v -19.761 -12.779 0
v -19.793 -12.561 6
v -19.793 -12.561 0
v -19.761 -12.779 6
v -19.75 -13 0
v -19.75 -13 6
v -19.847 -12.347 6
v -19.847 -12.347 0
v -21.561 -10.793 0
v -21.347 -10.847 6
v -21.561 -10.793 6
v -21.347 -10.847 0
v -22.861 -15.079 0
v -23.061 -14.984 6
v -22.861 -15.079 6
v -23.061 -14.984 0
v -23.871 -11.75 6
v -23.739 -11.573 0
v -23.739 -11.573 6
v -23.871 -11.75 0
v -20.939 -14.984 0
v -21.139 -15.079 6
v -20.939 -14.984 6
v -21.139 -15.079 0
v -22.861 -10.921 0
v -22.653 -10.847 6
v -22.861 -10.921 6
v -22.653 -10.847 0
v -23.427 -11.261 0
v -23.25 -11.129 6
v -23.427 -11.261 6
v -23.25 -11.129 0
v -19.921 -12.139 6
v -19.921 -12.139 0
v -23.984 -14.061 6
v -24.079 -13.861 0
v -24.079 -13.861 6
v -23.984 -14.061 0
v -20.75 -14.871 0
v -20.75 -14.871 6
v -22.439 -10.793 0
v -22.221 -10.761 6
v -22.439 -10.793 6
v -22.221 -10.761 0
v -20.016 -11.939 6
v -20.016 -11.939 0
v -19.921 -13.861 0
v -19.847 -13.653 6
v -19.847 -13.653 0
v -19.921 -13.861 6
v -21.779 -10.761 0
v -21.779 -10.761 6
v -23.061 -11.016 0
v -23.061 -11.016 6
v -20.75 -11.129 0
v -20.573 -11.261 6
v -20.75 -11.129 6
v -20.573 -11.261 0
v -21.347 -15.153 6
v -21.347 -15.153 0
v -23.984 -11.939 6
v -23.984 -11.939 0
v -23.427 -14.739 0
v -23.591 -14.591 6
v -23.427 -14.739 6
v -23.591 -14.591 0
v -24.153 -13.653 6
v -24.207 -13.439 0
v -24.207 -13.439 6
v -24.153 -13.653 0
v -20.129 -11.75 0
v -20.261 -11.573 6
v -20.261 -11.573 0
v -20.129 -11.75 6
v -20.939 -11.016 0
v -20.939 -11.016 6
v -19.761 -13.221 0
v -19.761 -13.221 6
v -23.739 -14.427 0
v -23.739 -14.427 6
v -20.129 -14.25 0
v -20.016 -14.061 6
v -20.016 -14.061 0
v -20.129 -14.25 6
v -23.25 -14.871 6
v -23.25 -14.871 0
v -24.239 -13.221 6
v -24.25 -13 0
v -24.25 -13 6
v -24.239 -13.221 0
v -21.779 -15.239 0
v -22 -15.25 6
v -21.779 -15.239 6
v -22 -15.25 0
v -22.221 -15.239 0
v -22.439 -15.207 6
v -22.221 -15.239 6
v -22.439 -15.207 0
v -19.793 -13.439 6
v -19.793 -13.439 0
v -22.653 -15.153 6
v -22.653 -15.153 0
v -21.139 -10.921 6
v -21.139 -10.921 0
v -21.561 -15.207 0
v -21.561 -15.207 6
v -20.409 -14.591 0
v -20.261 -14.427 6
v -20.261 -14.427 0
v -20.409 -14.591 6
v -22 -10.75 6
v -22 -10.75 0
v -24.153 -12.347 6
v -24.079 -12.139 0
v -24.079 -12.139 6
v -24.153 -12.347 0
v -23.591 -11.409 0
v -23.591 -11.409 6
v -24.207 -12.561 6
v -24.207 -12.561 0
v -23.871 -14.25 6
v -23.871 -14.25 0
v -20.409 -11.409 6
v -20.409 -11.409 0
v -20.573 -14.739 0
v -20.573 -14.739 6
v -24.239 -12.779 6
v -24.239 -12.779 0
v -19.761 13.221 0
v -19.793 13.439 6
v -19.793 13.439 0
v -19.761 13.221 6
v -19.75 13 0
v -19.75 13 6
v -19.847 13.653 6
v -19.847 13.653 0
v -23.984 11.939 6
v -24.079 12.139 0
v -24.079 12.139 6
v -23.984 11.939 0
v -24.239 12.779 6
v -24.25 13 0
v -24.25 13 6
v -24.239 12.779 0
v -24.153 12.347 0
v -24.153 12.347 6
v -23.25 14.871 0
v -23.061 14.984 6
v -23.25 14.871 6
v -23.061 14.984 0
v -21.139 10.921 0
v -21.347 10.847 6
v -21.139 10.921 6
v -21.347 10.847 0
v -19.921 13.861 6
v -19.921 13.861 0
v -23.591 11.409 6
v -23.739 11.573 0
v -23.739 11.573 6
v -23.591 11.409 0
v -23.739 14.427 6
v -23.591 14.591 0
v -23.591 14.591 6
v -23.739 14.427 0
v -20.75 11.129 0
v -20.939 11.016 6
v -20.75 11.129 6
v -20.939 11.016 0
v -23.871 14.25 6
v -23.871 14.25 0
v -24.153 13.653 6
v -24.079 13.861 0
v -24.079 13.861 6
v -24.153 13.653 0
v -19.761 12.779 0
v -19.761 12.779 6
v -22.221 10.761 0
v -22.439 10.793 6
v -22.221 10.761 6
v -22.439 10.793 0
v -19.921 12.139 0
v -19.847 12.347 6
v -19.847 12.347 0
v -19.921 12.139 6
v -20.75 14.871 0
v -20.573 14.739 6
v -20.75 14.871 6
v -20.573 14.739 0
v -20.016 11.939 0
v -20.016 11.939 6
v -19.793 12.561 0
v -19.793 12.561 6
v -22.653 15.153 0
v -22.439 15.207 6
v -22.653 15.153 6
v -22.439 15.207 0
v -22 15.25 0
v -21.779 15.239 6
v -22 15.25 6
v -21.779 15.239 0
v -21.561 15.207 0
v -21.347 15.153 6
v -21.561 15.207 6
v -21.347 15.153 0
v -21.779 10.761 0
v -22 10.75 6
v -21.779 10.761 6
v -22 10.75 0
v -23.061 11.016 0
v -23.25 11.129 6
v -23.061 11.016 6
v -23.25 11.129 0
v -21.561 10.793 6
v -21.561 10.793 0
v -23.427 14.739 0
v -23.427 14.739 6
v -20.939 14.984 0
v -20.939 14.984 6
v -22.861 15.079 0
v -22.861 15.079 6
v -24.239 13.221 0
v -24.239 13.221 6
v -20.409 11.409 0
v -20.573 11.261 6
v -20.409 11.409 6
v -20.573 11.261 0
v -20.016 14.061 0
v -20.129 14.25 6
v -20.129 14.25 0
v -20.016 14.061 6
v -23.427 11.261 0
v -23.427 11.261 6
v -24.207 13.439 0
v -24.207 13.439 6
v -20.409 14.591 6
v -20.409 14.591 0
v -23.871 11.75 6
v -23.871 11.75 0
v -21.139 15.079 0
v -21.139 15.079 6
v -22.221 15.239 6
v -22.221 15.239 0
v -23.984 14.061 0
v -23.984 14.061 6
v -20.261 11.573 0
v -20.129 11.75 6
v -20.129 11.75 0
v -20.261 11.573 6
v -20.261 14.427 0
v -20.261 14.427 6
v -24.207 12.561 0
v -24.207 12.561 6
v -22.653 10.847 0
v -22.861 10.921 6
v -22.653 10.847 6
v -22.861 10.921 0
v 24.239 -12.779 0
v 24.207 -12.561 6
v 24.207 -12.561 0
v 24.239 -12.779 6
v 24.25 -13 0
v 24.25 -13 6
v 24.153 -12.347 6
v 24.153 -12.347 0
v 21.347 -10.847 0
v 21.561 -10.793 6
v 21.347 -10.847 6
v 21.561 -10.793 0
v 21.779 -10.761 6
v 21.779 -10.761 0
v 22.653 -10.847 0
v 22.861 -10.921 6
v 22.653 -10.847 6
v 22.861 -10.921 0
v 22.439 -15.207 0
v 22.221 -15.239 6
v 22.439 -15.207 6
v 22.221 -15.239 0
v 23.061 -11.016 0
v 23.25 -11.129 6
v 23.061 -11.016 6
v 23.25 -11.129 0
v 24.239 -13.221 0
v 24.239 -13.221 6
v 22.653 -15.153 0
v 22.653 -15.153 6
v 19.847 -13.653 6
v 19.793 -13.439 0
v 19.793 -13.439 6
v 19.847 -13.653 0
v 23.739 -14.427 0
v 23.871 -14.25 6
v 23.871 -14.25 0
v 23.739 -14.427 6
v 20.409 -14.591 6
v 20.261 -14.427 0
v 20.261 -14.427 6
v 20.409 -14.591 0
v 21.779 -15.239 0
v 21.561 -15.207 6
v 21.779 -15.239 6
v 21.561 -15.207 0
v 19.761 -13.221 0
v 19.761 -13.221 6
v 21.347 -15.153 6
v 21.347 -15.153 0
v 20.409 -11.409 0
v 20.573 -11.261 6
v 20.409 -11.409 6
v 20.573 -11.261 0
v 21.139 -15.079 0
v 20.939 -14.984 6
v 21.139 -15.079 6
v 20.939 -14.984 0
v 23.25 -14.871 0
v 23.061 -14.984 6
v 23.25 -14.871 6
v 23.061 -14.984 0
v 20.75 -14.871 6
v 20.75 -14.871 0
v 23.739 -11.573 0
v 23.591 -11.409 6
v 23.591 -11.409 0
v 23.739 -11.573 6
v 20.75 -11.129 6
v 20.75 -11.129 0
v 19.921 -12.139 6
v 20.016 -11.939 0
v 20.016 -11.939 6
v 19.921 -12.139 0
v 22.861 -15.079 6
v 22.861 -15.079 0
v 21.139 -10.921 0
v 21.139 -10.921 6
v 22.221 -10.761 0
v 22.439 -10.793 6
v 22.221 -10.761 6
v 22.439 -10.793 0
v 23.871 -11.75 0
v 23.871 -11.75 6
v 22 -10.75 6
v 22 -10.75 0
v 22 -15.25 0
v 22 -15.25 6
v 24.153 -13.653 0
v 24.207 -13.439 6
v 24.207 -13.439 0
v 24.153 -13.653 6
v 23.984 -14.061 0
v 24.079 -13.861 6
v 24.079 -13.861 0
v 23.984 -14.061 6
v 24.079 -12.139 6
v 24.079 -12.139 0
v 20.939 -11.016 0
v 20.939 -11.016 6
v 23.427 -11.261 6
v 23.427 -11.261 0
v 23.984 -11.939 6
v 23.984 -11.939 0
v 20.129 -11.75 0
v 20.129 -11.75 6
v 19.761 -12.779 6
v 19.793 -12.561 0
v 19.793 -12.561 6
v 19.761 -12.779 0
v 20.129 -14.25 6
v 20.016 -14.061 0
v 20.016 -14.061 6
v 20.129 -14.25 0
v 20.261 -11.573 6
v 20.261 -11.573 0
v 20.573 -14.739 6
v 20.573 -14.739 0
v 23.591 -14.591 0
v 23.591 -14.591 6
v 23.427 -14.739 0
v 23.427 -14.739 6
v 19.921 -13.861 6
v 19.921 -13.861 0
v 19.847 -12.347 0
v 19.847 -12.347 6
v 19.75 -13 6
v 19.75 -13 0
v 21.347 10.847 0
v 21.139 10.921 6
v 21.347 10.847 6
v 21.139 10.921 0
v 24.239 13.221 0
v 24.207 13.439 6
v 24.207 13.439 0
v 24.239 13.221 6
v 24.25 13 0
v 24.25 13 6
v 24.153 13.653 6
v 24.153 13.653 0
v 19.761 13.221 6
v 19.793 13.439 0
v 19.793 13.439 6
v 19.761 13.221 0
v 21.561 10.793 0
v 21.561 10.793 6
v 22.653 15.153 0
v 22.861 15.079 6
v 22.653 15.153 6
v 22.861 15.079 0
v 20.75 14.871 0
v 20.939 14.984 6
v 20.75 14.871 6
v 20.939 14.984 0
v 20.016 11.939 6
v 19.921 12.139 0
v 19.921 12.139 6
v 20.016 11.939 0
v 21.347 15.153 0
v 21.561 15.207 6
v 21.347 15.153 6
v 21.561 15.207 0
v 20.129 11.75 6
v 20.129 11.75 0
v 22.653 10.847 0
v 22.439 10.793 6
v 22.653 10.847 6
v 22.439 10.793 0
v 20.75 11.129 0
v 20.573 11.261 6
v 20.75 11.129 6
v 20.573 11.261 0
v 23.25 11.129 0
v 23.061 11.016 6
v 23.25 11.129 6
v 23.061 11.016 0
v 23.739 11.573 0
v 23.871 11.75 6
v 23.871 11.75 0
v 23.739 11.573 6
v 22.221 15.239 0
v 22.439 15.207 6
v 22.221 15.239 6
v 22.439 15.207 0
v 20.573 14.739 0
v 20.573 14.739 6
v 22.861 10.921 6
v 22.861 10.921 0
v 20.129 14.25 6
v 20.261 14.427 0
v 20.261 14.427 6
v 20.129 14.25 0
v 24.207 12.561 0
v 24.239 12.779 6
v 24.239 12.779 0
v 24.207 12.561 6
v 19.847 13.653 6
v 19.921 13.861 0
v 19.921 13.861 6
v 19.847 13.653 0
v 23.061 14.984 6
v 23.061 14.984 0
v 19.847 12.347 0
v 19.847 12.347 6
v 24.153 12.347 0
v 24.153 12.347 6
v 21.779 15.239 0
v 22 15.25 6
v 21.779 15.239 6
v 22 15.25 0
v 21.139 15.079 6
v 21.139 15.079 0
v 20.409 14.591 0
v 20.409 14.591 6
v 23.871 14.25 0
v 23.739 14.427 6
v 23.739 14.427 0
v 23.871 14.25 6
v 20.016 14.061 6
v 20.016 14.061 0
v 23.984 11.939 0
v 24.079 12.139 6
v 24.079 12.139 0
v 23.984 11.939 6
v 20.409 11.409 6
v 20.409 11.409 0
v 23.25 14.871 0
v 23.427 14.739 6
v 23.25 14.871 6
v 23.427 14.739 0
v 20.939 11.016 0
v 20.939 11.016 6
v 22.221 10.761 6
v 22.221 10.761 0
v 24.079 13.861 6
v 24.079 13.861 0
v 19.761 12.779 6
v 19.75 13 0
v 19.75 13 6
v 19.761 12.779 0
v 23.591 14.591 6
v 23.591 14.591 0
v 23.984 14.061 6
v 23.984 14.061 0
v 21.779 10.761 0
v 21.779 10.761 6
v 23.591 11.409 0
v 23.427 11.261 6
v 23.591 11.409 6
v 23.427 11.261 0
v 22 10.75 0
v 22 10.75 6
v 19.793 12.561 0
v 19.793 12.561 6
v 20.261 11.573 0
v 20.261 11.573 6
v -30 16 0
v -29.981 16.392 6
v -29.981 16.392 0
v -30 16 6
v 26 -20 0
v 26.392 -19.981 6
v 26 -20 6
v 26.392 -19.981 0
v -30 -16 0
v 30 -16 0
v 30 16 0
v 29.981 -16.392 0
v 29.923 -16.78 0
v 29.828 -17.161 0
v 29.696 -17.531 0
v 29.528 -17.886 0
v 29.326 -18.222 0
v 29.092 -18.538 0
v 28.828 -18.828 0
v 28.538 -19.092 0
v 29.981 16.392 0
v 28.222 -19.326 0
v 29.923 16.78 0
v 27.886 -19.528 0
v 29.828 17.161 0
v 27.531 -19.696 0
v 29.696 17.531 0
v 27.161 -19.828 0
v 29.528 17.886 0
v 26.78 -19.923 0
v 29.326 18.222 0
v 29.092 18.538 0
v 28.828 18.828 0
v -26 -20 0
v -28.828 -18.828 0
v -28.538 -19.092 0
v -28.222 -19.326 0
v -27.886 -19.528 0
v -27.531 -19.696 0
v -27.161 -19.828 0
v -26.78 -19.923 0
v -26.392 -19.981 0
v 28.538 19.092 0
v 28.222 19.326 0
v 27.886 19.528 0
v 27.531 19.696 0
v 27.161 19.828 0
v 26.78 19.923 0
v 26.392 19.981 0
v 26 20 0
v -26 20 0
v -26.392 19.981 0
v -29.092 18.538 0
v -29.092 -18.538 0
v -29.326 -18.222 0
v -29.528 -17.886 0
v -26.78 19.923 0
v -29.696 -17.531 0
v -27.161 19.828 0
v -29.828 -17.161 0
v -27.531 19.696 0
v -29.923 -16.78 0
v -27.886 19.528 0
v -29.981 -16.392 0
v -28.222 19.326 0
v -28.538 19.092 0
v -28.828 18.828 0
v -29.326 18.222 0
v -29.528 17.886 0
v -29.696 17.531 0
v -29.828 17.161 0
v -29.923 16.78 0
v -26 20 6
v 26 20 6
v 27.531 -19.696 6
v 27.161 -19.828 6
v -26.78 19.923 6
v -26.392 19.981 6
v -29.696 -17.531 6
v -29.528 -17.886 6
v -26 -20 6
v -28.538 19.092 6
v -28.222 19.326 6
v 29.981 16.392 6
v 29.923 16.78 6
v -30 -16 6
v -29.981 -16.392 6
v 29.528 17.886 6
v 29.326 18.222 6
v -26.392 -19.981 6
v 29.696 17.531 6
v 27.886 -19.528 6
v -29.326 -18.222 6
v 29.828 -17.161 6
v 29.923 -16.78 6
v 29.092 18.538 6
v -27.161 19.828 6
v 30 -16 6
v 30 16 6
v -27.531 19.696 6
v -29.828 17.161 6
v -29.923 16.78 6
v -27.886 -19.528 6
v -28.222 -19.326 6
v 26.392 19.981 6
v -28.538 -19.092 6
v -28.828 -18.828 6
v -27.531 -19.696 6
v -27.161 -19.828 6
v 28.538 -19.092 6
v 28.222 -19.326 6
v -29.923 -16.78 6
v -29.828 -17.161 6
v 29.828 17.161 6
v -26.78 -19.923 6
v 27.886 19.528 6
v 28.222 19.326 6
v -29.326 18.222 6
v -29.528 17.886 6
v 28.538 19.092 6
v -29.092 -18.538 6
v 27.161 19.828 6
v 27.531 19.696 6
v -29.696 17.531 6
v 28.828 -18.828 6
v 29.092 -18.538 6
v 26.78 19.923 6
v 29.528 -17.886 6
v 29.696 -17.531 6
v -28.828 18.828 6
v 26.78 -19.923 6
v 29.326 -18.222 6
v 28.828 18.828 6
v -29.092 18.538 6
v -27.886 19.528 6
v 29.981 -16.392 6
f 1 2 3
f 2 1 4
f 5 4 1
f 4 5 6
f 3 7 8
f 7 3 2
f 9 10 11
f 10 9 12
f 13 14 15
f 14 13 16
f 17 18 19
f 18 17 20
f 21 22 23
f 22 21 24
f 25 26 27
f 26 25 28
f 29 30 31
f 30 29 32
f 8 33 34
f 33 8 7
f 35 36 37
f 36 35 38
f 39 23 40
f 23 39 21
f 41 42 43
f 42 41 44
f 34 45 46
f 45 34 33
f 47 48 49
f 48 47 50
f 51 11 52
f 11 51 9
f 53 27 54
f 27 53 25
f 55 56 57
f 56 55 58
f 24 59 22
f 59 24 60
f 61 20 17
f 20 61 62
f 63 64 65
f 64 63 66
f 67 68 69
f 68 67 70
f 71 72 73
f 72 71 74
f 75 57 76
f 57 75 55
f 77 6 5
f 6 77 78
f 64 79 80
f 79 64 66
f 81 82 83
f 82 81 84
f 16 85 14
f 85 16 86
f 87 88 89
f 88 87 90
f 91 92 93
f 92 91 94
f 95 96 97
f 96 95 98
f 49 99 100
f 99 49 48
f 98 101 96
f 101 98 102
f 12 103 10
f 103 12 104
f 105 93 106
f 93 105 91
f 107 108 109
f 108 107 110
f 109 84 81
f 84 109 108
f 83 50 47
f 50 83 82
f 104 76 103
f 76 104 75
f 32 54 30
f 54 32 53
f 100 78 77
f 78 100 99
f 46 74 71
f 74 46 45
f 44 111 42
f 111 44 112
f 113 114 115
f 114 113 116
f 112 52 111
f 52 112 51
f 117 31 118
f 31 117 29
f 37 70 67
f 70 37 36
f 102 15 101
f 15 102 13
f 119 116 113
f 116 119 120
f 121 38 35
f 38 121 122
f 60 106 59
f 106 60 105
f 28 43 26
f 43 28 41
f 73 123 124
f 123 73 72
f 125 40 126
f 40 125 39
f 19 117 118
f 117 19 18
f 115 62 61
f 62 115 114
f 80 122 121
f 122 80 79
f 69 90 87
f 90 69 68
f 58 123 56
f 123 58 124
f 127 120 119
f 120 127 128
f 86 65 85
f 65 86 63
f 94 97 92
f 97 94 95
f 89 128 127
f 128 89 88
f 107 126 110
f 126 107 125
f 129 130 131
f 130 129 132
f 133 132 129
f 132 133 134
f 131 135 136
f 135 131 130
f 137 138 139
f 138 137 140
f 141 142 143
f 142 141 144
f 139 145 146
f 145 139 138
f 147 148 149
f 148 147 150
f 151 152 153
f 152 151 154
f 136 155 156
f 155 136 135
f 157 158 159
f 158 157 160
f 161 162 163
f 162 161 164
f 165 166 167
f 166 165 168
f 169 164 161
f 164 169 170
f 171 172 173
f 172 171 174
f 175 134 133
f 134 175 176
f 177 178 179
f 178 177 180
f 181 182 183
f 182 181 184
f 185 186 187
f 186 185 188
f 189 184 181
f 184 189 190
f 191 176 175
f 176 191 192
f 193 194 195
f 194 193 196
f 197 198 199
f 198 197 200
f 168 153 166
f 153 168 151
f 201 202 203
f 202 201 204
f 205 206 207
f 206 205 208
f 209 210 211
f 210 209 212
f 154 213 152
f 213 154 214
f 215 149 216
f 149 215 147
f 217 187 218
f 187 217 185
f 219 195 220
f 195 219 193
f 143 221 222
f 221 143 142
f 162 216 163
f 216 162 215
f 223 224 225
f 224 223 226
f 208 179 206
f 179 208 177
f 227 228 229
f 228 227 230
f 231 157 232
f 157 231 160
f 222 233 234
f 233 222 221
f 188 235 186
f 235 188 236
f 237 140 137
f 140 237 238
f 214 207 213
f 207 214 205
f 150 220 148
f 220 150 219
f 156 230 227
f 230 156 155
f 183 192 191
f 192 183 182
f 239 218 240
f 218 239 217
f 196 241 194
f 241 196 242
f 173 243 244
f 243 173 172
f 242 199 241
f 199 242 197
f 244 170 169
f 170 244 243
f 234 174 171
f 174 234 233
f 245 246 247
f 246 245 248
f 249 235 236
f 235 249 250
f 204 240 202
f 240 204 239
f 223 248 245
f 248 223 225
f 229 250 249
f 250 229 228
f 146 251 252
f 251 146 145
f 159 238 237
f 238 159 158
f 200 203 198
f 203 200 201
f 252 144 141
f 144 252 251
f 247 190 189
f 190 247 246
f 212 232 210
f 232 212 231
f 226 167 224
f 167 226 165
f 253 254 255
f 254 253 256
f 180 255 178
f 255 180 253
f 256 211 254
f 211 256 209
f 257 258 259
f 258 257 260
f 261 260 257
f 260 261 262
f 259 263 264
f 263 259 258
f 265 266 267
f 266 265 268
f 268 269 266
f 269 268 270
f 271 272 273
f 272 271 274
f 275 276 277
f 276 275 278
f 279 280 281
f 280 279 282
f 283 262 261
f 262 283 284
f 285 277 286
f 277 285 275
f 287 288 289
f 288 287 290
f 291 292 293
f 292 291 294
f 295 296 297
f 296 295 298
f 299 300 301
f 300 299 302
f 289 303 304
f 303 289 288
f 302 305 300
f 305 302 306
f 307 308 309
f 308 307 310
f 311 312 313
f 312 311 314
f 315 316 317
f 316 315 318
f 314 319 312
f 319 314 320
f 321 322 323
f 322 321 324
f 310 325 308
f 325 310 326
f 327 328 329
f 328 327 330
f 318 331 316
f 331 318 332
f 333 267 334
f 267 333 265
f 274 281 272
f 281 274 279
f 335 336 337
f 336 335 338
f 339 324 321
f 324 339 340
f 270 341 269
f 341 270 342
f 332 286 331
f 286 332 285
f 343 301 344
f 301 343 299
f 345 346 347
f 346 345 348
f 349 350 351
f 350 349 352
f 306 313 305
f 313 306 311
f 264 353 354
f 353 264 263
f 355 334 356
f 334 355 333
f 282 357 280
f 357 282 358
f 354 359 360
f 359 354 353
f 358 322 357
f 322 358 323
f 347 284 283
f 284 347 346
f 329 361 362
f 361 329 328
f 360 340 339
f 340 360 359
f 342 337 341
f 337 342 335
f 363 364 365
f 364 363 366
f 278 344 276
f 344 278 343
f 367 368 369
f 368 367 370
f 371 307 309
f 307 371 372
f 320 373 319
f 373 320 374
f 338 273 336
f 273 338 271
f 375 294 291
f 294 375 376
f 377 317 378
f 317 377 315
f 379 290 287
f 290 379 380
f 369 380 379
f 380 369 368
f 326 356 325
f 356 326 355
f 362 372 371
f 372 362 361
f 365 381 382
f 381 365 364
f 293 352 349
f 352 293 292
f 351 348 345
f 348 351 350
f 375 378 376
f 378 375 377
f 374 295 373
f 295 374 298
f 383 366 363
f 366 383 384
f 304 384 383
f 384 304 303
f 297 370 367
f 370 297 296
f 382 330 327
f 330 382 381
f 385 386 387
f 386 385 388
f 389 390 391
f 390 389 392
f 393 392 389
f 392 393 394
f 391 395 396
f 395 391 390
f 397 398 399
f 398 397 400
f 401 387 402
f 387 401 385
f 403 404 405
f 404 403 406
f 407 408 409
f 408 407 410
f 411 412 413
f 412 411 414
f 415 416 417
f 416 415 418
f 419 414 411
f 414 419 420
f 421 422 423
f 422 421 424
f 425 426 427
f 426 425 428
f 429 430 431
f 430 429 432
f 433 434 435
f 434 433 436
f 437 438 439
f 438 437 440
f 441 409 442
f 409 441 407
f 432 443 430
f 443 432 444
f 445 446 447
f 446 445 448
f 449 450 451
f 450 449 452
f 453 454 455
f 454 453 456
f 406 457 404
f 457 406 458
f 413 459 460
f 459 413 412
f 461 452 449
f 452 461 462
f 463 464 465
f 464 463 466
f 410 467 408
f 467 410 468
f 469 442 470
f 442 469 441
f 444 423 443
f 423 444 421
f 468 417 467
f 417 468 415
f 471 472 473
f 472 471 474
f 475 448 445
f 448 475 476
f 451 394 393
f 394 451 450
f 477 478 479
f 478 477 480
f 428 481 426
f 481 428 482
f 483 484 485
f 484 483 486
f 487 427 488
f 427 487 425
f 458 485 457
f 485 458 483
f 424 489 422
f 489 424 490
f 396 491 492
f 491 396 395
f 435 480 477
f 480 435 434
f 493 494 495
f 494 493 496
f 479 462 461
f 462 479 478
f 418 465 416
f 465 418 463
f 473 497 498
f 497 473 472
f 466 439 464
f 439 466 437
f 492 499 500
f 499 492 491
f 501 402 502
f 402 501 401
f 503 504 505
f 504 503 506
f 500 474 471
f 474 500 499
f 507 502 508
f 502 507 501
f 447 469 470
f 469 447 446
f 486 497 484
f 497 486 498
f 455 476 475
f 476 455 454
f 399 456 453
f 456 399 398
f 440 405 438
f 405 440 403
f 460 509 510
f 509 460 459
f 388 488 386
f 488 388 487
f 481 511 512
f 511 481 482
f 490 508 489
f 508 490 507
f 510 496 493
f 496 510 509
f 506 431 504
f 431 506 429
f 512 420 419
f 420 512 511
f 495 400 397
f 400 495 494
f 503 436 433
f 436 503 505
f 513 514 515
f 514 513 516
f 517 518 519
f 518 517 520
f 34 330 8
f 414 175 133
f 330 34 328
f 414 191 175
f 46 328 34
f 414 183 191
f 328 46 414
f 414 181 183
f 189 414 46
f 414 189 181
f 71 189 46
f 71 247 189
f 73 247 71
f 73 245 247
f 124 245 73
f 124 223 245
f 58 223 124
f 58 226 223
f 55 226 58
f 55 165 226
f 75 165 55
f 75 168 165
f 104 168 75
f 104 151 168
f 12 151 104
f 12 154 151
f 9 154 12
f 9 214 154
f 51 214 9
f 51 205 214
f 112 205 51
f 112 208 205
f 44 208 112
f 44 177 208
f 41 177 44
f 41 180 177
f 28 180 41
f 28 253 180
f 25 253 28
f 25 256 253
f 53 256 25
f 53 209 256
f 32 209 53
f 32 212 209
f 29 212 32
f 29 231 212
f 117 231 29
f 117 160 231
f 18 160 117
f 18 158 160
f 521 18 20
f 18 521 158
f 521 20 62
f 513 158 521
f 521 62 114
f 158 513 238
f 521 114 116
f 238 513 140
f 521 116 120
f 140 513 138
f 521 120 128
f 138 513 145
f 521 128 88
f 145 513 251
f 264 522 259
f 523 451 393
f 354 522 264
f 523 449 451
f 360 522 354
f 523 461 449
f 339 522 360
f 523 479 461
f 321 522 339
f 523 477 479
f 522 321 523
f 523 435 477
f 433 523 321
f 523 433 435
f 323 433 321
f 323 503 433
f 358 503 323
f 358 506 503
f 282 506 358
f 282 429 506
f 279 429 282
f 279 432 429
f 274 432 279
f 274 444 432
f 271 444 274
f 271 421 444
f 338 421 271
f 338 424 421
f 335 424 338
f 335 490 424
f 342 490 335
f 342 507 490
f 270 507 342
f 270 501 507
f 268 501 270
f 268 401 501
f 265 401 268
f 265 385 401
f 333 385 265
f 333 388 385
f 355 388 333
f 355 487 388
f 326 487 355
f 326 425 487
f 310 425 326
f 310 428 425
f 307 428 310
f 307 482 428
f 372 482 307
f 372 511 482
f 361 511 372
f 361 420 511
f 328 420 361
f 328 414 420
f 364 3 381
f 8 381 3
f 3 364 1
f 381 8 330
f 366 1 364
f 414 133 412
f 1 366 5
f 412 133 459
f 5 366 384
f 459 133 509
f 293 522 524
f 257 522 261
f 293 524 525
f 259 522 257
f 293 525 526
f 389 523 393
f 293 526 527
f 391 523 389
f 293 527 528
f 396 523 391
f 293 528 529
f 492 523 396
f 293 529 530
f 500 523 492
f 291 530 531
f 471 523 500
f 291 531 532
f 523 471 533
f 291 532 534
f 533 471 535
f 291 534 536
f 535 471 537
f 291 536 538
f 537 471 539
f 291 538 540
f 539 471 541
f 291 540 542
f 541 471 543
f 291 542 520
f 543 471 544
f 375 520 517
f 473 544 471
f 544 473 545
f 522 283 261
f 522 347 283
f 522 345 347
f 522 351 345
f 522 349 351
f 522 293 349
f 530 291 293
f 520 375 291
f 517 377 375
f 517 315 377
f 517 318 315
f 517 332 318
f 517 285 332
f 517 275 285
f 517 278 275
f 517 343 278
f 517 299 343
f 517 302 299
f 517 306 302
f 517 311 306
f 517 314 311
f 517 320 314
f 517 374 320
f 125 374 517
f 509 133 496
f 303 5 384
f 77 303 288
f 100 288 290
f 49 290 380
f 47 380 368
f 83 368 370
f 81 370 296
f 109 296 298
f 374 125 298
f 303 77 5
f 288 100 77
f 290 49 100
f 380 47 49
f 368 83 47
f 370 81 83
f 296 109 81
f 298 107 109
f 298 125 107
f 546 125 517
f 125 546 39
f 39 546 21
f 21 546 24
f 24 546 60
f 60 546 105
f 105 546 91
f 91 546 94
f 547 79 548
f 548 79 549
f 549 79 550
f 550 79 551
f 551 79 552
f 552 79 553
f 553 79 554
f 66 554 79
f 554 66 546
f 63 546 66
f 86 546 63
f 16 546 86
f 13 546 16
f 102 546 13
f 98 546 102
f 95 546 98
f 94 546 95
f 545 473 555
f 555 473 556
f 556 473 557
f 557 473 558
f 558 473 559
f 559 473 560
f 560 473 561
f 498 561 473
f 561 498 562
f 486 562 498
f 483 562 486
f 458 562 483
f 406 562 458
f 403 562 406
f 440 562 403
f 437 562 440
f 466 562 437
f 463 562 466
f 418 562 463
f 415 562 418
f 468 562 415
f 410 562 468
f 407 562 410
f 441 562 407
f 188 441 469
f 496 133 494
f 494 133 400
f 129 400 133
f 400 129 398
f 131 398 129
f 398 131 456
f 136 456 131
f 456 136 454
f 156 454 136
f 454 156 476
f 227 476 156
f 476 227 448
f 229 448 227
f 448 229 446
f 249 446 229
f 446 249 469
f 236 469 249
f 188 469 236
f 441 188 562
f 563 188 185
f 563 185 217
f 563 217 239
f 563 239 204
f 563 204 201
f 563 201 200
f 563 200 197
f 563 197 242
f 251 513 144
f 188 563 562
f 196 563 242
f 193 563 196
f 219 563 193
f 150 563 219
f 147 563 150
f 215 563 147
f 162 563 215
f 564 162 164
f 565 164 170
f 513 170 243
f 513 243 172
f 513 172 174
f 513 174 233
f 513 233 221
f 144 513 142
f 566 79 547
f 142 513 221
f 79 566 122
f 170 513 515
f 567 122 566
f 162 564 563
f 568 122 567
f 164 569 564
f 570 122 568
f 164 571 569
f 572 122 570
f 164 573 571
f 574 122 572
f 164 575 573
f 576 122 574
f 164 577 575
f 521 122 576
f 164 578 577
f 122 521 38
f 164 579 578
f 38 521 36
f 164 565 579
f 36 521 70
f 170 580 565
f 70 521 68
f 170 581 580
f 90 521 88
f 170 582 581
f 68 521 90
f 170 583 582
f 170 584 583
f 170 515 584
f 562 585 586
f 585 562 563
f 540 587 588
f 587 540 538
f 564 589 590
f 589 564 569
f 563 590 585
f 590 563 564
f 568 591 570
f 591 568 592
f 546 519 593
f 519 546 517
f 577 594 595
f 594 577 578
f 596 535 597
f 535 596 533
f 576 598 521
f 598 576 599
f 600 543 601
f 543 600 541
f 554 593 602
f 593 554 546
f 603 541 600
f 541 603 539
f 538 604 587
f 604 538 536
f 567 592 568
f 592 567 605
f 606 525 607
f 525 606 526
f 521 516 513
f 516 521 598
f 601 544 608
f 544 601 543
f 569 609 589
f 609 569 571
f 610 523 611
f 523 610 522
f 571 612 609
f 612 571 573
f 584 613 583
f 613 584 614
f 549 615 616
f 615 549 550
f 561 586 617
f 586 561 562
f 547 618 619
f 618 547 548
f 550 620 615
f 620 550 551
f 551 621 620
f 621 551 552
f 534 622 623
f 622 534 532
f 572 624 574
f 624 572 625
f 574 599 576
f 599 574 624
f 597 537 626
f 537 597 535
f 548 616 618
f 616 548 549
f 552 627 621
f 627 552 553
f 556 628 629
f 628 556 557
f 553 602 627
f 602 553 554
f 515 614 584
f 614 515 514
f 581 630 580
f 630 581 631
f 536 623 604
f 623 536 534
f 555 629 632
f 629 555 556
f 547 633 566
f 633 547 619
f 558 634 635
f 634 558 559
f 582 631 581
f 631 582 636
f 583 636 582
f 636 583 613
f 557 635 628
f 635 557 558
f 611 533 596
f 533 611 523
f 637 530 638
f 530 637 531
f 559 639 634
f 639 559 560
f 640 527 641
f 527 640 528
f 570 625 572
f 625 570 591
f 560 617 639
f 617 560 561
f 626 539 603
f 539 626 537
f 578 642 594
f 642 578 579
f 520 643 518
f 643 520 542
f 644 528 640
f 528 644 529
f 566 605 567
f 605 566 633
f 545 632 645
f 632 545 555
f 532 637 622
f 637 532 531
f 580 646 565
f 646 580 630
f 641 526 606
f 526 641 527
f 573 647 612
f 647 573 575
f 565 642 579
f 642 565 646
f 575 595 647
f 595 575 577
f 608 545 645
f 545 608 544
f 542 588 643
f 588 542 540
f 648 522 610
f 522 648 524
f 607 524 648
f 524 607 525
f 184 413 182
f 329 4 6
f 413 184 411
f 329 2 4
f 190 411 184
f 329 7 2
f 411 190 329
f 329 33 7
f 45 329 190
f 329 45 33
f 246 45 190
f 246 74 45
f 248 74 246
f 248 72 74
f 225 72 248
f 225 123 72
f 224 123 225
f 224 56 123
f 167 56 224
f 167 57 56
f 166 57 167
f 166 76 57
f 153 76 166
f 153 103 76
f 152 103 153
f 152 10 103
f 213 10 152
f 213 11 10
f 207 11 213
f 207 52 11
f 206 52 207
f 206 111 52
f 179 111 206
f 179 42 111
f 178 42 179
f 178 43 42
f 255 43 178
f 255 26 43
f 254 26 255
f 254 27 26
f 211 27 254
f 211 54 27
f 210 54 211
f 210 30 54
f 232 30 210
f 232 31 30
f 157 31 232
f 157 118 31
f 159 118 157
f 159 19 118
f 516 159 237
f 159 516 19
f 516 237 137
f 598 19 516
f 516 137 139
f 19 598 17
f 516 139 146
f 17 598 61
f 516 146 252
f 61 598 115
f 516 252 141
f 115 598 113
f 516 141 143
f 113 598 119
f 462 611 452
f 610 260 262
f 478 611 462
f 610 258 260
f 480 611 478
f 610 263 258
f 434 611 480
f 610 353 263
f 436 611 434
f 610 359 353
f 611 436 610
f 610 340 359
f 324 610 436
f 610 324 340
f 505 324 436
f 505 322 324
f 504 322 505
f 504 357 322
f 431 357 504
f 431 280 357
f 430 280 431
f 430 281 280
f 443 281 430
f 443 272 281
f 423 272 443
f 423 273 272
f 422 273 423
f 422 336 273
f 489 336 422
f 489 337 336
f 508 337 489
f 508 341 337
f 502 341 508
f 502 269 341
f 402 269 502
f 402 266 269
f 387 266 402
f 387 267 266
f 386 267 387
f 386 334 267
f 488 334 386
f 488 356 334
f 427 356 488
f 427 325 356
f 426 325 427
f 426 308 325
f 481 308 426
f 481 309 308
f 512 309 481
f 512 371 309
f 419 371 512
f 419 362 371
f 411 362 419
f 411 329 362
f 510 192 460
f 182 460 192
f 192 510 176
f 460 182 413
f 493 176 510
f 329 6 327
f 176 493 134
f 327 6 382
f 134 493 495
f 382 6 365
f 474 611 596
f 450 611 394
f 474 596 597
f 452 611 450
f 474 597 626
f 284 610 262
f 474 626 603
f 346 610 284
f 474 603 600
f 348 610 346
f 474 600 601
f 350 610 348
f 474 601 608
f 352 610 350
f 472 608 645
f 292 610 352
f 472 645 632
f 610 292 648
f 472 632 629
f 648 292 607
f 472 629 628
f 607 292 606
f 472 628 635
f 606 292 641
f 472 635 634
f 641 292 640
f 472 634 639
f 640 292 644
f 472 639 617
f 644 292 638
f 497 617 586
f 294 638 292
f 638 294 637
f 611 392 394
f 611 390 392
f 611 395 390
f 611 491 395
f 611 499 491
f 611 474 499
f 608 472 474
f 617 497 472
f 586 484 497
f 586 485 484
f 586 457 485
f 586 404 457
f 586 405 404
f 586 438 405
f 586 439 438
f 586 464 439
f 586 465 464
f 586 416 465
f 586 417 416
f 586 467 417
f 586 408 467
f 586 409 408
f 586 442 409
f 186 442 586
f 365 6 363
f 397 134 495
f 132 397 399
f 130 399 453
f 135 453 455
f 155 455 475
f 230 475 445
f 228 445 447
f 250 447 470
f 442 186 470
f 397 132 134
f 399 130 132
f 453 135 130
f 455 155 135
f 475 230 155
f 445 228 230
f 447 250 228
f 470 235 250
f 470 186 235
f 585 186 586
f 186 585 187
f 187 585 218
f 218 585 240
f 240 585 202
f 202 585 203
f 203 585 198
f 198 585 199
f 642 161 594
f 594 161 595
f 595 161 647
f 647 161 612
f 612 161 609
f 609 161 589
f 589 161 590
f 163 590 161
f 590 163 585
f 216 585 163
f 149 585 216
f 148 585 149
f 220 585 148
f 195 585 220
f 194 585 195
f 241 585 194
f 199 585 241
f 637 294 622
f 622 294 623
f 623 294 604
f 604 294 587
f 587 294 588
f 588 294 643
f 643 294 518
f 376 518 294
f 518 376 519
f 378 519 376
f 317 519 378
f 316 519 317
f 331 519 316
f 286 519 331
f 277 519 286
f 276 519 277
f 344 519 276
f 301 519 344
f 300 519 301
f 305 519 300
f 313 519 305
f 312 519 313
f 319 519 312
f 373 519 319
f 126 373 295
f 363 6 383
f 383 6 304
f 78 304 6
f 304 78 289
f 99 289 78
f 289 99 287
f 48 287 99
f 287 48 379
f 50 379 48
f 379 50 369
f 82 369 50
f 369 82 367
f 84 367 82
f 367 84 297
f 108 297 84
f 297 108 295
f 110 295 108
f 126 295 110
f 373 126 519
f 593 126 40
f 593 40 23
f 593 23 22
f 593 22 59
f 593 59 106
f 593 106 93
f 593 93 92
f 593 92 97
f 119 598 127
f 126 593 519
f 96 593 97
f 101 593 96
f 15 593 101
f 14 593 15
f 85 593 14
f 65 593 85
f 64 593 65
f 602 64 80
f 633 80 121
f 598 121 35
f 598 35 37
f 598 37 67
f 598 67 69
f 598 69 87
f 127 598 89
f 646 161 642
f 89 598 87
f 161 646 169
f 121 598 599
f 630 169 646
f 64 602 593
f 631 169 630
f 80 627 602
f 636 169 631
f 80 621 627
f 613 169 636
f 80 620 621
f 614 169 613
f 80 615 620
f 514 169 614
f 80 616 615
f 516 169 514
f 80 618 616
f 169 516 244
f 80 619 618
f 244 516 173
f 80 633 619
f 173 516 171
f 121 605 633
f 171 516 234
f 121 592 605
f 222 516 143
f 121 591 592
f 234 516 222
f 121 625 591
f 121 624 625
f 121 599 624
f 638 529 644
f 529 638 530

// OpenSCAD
$fn = 64;
difference() {
  linear_extrude(height = 6)
    offset(r = 4)
      offset(r = -4)
        square([60, 40], center = true);
  for (x = [-22, 22])
    for (y = [-13, 13])
      translate([x, y, -1])
        cylinder(h = 8, d = 4.5);
}
